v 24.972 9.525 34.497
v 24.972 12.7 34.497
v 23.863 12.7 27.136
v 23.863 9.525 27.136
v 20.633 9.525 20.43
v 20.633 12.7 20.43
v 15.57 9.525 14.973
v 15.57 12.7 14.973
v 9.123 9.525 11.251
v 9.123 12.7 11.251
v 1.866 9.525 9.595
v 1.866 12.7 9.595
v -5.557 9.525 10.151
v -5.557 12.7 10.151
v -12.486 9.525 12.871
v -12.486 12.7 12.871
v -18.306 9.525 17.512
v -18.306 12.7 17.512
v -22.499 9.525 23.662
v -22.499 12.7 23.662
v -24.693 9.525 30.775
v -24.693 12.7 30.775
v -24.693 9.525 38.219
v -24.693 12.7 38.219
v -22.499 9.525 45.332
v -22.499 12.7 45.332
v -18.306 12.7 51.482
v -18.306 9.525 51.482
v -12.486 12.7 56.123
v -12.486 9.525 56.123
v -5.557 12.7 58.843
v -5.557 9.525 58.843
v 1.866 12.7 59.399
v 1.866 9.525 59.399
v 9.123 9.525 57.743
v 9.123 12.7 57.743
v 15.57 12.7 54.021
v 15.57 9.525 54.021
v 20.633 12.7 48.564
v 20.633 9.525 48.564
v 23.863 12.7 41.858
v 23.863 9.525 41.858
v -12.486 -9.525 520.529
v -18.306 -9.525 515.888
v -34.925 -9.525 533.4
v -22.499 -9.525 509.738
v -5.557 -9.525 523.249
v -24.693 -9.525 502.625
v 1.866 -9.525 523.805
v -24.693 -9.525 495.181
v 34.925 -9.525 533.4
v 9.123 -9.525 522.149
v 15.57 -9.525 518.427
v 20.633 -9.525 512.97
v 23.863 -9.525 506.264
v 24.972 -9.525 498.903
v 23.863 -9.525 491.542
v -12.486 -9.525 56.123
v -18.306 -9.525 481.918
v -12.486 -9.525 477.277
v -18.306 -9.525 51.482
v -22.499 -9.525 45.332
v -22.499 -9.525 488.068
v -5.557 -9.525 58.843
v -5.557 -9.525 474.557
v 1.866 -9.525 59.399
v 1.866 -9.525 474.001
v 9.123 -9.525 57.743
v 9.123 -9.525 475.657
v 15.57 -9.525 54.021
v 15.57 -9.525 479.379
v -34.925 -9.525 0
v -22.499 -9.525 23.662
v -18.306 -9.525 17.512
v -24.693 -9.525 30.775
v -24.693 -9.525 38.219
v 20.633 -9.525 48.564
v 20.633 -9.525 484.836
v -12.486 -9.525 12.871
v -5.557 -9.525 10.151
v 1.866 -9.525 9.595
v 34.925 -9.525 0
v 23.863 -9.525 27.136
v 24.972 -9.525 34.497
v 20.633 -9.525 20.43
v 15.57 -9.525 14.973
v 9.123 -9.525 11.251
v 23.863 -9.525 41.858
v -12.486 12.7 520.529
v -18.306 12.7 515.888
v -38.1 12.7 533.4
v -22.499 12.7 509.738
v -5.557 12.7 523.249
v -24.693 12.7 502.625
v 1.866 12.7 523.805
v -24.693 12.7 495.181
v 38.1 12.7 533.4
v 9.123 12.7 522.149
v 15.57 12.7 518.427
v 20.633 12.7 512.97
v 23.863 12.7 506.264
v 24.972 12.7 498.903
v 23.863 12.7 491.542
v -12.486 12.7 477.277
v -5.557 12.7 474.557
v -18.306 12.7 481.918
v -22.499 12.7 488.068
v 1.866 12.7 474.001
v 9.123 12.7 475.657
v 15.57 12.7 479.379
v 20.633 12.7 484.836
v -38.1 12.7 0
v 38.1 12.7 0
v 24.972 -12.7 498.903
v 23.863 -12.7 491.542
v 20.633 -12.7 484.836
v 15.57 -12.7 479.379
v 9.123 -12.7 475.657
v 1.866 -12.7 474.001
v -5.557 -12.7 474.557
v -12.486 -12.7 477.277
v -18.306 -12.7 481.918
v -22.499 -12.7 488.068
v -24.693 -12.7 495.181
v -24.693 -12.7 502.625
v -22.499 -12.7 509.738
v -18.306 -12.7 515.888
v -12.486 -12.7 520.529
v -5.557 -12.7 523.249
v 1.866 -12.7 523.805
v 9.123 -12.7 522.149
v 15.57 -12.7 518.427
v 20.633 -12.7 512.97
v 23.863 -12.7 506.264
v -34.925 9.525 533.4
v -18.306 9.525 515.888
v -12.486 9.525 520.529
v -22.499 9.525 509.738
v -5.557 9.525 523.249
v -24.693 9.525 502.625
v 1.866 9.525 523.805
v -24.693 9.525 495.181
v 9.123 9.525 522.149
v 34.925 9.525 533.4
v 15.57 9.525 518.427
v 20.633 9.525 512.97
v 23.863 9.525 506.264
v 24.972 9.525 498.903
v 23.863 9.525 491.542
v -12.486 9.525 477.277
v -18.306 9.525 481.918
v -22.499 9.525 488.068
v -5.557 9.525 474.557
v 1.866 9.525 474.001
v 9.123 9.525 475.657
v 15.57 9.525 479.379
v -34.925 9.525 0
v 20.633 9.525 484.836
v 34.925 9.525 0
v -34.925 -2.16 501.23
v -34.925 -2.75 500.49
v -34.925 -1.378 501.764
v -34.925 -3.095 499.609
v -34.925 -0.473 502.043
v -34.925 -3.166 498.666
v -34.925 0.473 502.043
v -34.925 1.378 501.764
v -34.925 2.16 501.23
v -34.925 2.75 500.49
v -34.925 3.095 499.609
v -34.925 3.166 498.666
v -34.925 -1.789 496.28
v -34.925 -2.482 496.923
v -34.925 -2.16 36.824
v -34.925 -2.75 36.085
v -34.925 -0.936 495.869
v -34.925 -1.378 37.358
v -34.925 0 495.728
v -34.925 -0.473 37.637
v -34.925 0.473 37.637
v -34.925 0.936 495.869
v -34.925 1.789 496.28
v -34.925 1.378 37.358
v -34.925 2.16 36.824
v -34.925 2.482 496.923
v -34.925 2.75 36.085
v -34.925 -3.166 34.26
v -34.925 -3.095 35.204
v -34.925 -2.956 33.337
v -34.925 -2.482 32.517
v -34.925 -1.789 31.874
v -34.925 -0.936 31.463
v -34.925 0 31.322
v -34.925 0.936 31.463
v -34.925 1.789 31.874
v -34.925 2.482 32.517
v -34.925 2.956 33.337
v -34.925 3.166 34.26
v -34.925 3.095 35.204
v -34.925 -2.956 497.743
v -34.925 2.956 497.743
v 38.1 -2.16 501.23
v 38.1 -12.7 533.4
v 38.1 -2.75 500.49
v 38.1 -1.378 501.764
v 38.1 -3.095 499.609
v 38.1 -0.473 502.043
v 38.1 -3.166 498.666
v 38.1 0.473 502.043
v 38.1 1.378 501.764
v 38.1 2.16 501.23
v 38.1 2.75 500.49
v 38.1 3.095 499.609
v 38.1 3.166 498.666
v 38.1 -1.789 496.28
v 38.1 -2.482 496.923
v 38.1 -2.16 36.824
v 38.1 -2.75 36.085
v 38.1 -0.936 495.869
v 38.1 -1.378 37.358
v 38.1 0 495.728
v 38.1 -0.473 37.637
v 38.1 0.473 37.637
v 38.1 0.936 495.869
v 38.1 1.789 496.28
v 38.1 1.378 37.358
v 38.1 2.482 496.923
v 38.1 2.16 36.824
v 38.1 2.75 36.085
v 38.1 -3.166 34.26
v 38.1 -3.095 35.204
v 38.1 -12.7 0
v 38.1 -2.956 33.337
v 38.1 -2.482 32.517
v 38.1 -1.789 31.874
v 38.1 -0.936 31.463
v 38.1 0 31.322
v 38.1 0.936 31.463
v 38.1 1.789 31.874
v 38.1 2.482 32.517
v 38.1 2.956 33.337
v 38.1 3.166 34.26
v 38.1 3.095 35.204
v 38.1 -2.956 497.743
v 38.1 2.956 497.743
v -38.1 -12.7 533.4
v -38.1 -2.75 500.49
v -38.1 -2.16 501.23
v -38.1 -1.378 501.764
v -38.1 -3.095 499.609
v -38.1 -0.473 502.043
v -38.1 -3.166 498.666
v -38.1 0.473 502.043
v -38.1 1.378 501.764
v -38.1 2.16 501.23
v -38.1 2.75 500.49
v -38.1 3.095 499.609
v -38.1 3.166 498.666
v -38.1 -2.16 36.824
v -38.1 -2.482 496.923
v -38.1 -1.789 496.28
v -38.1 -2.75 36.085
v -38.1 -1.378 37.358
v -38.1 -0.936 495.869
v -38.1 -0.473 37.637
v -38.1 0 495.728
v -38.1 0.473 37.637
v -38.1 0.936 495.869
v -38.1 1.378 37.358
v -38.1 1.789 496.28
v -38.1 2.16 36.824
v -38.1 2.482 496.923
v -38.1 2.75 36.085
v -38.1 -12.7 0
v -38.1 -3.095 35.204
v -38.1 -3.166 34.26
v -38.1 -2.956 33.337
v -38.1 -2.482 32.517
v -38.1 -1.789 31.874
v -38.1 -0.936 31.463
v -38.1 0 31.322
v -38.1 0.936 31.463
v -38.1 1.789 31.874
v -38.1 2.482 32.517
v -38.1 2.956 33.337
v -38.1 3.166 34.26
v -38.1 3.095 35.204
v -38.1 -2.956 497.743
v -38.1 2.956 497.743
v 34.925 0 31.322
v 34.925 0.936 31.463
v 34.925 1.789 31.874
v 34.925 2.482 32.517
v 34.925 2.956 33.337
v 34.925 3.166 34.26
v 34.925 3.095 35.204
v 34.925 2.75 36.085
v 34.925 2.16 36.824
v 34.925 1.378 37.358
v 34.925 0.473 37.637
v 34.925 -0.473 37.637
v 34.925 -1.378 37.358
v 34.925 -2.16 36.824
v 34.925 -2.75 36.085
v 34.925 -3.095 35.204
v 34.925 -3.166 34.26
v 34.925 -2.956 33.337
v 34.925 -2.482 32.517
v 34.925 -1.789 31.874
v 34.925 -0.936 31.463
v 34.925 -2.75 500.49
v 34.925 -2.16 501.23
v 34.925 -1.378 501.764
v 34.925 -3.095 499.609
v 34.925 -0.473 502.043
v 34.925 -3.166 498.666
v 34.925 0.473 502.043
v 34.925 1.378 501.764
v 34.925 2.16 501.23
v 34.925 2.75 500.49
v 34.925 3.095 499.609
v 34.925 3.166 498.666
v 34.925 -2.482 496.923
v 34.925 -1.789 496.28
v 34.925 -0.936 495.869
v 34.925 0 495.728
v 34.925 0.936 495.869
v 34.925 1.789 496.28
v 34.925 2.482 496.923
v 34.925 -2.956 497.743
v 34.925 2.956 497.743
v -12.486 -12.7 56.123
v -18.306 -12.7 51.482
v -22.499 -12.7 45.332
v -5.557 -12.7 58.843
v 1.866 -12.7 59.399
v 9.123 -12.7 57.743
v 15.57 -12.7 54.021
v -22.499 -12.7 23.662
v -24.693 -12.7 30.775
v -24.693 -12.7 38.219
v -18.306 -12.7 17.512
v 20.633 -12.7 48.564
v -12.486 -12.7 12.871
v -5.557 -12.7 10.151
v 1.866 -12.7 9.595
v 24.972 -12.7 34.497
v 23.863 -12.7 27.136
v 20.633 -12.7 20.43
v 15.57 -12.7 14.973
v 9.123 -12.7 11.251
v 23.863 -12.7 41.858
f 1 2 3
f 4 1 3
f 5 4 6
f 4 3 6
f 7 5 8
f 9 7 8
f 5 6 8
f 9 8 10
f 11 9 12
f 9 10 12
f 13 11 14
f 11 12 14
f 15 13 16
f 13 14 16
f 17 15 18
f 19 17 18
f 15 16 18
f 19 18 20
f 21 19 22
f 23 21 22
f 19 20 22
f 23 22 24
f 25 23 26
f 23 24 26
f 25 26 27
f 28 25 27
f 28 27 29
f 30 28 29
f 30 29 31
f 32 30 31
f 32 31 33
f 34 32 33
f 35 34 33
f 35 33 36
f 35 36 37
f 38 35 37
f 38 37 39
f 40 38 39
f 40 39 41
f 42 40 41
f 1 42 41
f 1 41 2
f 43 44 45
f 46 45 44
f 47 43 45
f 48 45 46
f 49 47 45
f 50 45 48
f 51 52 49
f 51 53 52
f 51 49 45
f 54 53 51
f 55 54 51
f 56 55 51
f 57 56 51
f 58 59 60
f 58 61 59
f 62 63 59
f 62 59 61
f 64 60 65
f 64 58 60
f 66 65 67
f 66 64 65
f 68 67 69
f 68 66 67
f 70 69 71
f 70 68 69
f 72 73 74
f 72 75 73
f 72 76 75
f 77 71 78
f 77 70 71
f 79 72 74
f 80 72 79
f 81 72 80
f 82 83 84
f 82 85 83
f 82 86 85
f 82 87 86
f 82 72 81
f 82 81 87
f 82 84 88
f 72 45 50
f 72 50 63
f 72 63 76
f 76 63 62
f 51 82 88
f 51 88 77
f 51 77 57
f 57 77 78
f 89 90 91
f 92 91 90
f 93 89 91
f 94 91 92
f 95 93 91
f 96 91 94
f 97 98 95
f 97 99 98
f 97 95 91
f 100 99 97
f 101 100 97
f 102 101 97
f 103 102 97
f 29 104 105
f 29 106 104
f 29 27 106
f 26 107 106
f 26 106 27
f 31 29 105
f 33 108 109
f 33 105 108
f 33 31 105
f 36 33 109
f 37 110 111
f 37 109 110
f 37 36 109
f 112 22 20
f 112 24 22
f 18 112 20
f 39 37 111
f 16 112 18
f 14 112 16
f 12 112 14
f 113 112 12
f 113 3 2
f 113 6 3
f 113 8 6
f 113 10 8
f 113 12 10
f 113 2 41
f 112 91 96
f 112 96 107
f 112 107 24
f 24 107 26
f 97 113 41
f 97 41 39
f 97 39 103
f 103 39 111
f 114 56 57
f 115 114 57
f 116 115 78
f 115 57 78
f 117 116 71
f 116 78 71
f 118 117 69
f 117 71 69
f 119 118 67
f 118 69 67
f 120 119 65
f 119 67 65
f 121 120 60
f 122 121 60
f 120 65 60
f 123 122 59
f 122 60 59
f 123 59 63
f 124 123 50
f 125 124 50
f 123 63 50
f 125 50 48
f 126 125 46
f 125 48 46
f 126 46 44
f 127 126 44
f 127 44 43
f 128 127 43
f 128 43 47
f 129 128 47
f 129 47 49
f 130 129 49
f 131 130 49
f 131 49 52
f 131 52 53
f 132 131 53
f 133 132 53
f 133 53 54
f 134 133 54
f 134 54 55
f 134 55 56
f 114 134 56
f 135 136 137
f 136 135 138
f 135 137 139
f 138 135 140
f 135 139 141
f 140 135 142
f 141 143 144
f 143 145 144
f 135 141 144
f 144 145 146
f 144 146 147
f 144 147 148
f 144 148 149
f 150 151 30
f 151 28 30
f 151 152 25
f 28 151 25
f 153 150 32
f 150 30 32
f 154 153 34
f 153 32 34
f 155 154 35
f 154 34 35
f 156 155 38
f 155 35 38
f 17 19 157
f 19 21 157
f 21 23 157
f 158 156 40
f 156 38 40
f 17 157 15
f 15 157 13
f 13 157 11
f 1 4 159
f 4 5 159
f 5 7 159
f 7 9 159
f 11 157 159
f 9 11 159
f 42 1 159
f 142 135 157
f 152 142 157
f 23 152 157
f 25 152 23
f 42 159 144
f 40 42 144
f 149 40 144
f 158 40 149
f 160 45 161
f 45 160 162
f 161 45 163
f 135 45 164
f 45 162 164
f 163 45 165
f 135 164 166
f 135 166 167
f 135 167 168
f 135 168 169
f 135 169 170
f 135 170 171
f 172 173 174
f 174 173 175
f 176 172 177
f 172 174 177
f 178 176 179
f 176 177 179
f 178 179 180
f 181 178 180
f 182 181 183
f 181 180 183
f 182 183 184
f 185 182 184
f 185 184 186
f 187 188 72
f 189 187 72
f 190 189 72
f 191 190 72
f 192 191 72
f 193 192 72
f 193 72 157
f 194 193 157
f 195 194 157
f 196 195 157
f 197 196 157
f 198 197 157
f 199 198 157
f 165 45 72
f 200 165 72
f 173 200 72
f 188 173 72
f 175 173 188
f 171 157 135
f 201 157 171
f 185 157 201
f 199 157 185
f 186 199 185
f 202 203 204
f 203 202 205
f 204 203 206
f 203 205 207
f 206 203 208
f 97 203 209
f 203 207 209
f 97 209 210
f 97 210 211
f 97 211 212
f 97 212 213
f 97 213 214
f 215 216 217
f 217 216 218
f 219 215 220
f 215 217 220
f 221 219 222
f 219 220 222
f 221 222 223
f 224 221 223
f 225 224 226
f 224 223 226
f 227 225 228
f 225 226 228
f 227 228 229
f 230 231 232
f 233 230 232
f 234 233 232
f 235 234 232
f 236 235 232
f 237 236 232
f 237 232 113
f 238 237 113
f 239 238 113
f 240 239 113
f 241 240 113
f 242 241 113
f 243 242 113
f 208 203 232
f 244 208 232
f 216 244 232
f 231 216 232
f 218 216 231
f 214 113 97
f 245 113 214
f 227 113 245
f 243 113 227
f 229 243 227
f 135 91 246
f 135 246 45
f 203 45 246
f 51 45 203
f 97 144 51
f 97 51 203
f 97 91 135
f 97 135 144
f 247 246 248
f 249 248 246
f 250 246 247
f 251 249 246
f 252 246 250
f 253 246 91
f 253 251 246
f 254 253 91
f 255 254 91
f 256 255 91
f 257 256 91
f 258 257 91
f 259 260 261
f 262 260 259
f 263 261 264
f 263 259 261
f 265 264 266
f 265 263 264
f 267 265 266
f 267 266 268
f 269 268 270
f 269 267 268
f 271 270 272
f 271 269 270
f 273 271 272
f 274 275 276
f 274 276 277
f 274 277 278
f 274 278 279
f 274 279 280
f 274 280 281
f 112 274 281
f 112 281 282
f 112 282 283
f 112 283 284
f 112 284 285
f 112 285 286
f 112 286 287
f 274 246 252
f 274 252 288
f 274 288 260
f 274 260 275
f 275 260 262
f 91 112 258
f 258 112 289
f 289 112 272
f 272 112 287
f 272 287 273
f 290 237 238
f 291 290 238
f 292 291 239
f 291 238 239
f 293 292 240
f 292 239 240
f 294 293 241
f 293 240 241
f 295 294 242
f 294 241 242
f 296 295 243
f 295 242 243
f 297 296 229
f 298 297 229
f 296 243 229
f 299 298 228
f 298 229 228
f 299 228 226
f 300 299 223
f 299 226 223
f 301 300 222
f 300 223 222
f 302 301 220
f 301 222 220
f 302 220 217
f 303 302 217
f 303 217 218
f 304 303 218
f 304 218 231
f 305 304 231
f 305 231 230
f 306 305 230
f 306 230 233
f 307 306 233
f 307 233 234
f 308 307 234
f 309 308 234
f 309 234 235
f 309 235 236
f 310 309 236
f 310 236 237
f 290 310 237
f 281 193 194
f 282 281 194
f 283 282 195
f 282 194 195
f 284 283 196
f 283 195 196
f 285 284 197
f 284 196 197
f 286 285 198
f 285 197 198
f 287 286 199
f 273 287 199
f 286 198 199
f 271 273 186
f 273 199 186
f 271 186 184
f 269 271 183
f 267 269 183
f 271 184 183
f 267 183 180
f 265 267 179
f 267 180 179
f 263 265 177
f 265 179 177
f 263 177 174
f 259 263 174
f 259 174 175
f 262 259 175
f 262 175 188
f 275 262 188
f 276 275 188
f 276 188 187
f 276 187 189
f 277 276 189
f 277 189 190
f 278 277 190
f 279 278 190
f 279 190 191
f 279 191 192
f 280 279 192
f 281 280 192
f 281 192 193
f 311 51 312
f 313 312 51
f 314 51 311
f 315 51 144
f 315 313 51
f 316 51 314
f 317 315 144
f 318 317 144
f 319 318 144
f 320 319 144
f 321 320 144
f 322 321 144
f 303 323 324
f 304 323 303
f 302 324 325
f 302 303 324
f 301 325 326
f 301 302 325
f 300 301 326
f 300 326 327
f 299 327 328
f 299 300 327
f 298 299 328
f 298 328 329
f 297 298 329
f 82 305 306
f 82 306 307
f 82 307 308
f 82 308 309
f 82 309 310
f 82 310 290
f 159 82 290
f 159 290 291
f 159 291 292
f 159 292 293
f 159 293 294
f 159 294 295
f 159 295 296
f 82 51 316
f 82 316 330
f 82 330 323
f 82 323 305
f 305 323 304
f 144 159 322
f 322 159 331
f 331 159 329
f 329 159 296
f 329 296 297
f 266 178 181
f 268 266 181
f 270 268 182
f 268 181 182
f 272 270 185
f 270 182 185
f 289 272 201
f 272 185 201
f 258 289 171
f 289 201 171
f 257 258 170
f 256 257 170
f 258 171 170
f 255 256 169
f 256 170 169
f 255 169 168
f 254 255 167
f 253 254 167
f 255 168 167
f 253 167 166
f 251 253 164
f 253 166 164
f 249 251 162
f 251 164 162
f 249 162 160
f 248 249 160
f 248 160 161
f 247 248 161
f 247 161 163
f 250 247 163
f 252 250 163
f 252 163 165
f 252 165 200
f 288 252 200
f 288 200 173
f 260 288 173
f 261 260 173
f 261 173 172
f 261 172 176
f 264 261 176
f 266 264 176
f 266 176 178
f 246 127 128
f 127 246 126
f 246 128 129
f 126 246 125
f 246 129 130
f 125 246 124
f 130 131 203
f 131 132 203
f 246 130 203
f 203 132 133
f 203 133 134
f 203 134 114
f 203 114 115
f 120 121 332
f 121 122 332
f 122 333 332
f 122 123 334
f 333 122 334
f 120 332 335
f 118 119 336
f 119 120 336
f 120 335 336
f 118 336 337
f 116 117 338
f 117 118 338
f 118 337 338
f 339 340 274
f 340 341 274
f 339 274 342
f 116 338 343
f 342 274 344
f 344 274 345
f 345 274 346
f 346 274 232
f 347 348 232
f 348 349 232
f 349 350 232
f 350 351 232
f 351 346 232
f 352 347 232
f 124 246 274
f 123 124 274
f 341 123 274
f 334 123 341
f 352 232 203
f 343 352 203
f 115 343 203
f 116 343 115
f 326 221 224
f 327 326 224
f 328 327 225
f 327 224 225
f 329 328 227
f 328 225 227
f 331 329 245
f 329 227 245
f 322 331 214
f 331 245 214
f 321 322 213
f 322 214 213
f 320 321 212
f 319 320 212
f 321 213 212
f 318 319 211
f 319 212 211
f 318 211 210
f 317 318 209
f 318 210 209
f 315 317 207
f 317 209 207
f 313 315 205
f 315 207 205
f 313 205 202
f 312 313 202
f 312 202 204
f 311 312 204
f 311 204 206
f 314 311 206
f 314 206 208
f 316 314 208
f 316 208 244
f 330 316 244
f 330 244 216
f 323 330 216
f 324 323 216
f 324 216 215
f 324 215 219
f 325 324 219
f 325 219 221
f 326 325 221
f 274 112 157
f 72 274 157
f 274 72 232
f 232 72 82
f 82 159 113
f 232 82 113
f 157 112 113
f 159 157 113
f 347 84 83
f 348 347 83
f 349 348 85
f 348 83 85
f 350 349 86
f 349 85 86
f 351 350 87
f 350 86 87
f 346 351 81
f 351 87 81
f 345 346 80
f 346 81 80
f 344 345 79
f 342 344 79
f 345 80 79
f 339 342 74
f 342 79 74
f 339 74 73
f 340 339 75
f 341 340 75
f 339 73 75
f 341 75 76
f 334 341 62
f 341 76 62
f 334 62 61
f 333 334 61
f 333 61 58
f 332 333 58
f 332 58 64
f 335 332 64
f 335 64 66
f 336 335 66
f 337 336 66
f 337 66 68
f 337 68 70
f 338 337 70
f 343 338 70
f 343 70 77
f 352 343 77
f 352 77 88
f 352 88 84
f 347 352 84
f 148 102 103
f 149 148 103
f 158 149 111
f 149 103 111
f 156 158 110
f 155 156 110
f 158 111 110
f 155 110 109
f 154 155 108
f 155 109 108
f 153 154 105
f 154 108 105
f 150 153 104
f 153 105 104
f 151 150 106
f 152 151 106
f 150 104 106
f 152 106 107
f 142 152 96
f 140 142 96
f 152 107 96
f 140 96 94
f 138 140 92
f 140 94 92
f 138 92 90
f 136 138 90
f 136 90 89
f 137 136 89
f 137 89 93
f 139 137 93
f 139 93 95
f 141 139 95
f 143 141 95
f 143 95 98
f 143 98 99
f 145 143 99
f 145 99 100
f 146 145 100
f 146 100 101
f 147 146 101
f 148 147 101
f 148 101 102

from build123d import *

# Parameters (mm, degrees)
SKETCH1_W           = 76.2
SKETCH1_H           = 25.4
SKETCH1_W_2         = 69.85
SKETCH1_H_2         = 19.05
EXTRUDE_THIN1_DEPTH = 533.4
SKETCH3_R           = 24.97201
CUT_EXTRUDE2_DEPTH  = 26.4
SKETCH4_R           = 3.175
CUT_EXTRUDE3_DEPTH  = 77.2


with BuildPart() as part:
    # Sketch1 → Extrude-Thin1 (new body)
    with BuildSketch(Plane.XY):
        Rectangle(SKETCH1_W, SKETCH1_H)
        Rectangle(SKETCH1_W_2, SKETCH1_H_2, mode=Mode.SUBTRACT)
    extrude(amount=EXTRUDE_THIN1_DEPTH)

    # Sketch3 → Cut-Extrude2 (cut, through all)
    with BuildSketch(Plane(origin=(0, 12.7, 0), x_dir=(1, 0, 0), z_dir=(0, 1, 0))):
        with Locations((0, -34.49701)):
            Circle(SKETCH3_R)
        with Locations((0, -498.90299)):
            Circle(SKETCH3_R)
    extrude(amount=-CUT_EXTRUDE2_DEPTH, mode=Mode.SUBTRACT)

    # Sketch4 → Cut-Extrude3 (cut, through all)
    with BuildSketch(Plane(origin=(38.1, 0, 0), x_dir=(0, 0, -1), z_dir=(1, 0, 0))):
        with Locations((-34.49701, 0)):
            Circle(SKETCH4_R)
        with Locations((-498.90299, 0)):
            Circle(SKETCH4_R)
    extrude(amount=-CUT_EXTRUDE3_DEPTH, mode=Mode.SUBTRACT)


solid = part.part
